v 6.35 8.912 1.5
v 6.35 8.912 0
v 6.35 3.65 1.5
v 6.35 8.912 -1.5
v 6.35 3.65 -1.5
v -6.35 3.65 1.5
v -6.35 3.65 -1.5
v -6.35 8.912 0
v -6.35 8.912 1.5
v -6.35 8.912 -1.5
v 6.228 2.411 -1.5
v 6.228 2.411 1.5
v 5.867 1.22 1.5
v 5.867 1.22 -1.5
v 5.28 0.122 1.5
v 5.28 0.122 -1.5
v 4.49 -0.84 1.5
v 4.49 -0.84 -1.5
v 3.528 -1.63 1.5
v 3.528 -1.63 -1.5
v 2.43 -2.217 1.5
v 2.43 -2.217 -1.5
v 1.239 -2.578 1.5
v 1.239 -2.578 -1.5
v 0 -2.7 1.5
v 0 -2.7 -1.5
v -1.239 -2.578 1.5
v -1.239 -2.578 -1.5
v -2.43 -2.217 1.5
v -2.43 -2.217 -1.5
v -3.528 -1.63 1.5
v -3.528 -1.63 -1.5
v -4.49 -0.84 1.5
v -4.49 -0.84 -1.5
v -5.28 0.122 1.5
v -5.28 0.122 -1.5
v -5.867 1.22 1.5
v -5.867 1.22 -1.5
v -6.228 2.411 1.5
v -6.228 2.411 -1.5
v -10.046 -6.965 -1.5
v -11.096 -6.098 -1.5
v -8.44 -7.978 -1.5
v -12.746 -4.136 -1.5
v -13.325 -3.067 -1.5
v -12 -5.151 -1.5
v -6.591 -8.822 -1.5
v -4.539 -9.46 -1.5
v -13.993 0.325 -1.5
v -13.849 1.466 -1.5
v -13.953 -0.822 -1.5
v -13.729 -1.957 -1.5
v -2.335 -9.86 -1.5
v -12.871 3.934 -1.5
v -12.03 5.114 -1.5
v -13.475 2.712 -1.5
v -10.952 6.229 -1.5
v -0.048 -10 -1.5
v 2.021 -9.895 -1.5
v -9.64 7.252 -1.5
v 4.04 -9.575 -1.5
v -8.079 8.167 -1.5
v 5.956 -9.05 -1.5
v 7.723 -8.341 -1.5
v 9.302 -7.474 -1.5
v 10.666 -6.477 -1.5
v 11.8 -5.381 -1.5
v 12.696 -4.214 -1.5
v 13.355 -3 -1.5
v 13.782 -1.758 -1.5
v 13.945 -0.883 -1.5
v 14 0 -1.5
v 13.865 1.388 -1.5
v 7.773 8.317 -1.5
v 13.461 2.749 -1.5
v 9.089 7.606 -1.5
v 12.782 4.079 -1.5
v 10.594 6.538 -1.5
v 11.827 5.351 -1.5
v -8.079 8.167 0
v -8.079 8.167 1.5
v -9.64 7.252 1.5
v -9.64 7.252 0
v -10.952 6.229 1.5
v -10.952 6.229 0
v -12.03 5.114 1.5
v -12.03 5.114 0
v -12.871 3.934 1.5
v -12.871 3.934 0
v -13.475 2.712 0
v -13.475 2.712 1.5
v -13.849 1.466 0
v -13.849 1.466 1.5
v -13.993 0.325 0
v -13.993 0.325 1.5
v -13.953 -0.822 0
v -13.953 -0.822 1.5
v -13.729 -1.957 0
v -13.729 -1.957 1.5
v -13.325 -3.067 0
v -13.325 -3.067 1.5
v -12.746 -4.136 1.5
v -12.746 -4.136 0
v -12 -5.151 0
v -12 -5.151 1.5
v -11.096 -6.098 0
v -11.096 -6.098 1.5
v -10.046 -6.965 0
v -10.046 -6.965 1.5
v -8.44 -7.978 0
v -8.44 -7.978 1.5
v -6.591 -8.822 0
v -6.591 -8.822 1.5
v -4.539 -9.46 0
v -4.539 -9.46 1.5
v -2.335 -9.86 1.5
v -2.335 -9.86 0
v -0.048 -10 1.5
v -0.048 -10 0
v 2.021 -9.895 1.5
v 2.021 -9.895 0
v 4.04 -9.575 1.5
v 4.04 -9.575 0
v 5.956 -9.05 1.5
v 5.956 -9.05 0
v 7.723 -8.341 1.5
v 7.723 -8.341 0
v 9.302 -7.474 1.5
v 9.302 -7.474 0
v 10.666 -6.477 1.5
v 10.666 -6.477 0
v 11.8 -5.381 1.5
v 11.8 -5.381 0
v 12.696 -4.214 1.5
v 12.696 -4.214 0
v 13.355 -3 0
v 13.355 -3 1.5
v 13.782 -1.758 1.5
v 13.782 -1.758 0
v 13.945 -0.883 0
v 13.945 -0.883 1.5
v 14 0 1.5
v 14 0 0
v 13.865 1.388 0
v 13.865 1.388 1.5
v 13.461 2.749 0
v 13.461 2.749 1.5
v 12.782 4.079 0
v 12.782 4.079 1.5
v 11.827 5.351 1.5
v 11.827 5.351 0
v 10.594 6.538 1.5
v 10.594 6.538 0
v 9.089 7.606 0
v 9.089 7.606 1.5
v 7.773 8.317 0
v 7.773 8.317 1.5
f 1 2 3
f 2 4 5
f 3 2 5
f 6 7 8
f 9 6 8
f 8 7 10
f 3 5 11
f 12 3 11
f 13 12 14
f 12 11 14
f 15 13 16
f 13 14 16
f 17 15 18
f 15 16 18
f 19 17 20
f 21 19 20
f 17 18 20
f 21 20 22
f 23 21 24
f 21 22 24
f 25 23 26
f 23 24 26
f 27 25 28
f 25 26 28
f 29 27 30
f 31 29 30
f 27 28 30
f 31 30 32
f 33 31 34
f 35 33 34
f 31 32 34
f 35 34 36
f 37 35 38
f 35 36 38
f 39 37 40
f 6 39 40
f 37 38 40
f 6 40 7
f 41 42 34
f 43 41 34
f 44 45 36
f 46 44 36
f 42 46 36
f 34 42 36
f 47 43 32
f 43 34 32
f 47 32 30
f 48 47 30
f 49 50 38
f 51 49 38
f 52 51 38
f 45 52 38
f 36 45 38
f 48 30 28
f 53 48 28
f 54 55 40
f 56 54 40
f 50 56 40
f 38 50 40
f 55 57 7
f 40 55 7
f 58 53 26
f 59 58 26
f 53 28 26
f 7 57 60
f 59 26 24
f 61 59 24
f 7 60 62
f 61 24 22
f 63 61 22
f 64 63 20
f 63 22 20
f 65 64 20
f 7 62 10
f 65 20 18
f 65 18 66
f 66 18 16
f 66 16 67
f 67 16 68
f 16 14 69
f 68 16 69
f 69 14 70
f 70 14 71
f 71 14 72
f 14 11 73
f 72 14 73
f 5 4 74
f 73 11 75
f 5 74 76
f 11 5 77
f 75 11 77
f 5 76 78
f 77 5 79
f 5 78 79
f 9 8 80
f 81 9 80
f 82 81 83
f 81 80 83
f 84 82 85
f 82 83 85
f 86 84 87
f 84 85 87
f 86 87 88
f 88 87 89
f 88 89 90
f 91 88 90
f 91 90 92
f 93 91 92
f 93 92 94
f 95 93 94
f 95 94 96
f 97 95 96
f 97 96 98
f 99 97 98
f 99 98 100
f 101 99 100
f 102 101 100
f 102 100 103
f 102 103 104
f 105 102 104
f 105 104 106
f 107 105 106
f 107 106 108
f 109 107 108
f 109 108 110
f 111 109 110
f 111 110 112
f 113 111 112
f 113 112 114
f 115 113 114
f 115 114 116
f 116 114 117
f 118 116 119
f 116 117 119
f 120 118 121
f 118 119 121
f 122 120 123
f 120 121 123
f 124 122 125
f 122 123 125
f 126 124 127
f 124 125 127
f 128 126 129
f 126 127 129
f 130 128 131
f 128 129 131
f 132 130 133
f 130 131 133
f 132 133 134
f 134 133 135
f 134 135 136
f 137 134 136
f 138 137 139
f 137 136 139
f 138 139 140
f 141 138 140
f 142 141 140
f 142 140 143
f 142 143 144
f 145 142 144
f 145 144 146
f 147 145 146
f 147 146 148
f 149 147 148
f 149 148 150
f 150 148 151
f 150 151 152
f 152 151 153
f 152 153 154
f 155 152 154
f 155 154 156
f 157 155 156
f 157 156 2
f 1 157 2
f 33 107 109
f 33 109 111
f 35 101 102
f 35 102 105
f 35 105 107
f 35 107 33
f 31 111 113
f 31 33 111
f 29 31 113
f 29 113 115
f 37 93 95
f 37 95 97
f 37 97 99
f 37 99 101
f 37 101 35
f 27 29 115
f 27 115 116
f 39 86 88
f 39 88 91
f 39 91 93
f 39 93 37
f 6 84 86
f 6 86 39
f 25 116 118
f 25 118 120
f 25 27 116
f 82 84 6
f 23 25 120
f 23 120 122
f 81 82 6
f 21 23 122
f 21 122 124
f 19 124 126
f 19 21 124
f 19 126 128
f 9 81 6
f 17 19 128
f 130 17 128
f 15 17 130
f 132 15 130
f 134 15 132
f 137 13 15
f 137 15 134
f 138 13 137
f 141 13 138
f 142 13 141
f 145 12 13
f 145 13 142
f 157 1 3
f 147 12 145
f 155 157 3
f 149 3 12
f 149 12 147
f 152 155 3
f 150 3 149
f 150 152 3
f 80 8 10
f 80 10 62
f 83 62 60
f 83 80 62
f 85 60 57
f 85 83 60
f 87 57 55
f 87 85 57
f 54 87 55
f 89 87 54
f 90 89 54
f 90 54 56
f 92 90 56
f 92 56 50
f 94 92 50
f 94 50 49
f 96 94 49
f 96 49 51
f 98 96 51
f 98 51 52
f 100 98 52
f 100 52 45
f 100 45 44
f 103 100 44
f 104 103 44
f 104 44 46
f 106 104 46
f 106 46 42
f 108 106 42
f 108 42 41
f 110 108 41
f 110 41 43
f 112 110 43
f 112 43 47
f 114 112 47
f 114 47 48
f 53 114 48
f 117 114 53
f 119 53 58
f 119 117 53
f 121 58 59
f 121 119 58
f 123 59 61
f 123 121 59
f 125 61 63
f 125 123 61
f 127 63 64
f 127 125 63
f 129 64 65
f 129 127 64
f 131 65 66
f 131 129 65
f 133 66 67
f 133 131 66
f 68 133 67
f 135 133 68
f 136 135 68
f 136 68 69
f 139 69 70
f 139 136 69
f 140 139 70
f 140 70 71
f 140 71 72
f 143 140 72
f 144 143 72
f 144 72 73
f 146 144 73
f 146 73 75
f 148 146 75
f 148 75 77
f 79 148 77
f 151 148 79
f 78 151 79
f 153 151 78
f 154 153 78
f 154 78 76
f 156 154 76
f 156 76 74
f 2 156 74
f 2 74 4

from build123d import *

# Parameters (mm, degrees)
SKETCH1_RX          = 14
SKETCH1_RY          = 10
RING_EXTRUDE_DEPTH  = 1.5
SPAR_CUT_DEPTH      = 18.464249197
SPAR_CUT_DEPTH_BACK = 18.464249197


with BuildPart() as part:
    # Sketch1 → Ring extrude (new, symmetric)
    with BuildSketch(Plane.XY):
        with Locations((0, 0)):
            Ellipse(SKETCH1_RX, SKETCH1_RY)
    extrude(amount=RING_EXTRUDE_DEPTH, both=True)

    # Sketch2 → Spar cut (cut, two sides: drawn at the far end of the back side and taken through both)
    with BuildSketch(Plane.XY.offset(1.5).offset(-SPAR_CUT_DEPTH_BACK)):
        with BuildLine():
            Line((-6.35, 3.65), (-6.35, 8.912199275))
            add(Edge.make_bspline(
                [(6.35, 8.912199275), (0, 11.220574957), (-6.35, 8.912199275)],
                knots=[1.100027707, 1.100027707, 1.100027707, 2.041564947, 2.041564947, 2.041564947], degree=2, weights=[1, 0.891219928, 1]))
            Line((6.35, 8.912199275), (6.35, 3.65))
            ThreePointArc((6.35, 3.65), (0, -2.7), (-6.35, 3.65))
        make_face()
    extrude(amount=SPAR_CUT_DEPTH + SPAR_CUT_DEPTH_BACK, mode=Mode.SUBTRACT)


solid = part.part
